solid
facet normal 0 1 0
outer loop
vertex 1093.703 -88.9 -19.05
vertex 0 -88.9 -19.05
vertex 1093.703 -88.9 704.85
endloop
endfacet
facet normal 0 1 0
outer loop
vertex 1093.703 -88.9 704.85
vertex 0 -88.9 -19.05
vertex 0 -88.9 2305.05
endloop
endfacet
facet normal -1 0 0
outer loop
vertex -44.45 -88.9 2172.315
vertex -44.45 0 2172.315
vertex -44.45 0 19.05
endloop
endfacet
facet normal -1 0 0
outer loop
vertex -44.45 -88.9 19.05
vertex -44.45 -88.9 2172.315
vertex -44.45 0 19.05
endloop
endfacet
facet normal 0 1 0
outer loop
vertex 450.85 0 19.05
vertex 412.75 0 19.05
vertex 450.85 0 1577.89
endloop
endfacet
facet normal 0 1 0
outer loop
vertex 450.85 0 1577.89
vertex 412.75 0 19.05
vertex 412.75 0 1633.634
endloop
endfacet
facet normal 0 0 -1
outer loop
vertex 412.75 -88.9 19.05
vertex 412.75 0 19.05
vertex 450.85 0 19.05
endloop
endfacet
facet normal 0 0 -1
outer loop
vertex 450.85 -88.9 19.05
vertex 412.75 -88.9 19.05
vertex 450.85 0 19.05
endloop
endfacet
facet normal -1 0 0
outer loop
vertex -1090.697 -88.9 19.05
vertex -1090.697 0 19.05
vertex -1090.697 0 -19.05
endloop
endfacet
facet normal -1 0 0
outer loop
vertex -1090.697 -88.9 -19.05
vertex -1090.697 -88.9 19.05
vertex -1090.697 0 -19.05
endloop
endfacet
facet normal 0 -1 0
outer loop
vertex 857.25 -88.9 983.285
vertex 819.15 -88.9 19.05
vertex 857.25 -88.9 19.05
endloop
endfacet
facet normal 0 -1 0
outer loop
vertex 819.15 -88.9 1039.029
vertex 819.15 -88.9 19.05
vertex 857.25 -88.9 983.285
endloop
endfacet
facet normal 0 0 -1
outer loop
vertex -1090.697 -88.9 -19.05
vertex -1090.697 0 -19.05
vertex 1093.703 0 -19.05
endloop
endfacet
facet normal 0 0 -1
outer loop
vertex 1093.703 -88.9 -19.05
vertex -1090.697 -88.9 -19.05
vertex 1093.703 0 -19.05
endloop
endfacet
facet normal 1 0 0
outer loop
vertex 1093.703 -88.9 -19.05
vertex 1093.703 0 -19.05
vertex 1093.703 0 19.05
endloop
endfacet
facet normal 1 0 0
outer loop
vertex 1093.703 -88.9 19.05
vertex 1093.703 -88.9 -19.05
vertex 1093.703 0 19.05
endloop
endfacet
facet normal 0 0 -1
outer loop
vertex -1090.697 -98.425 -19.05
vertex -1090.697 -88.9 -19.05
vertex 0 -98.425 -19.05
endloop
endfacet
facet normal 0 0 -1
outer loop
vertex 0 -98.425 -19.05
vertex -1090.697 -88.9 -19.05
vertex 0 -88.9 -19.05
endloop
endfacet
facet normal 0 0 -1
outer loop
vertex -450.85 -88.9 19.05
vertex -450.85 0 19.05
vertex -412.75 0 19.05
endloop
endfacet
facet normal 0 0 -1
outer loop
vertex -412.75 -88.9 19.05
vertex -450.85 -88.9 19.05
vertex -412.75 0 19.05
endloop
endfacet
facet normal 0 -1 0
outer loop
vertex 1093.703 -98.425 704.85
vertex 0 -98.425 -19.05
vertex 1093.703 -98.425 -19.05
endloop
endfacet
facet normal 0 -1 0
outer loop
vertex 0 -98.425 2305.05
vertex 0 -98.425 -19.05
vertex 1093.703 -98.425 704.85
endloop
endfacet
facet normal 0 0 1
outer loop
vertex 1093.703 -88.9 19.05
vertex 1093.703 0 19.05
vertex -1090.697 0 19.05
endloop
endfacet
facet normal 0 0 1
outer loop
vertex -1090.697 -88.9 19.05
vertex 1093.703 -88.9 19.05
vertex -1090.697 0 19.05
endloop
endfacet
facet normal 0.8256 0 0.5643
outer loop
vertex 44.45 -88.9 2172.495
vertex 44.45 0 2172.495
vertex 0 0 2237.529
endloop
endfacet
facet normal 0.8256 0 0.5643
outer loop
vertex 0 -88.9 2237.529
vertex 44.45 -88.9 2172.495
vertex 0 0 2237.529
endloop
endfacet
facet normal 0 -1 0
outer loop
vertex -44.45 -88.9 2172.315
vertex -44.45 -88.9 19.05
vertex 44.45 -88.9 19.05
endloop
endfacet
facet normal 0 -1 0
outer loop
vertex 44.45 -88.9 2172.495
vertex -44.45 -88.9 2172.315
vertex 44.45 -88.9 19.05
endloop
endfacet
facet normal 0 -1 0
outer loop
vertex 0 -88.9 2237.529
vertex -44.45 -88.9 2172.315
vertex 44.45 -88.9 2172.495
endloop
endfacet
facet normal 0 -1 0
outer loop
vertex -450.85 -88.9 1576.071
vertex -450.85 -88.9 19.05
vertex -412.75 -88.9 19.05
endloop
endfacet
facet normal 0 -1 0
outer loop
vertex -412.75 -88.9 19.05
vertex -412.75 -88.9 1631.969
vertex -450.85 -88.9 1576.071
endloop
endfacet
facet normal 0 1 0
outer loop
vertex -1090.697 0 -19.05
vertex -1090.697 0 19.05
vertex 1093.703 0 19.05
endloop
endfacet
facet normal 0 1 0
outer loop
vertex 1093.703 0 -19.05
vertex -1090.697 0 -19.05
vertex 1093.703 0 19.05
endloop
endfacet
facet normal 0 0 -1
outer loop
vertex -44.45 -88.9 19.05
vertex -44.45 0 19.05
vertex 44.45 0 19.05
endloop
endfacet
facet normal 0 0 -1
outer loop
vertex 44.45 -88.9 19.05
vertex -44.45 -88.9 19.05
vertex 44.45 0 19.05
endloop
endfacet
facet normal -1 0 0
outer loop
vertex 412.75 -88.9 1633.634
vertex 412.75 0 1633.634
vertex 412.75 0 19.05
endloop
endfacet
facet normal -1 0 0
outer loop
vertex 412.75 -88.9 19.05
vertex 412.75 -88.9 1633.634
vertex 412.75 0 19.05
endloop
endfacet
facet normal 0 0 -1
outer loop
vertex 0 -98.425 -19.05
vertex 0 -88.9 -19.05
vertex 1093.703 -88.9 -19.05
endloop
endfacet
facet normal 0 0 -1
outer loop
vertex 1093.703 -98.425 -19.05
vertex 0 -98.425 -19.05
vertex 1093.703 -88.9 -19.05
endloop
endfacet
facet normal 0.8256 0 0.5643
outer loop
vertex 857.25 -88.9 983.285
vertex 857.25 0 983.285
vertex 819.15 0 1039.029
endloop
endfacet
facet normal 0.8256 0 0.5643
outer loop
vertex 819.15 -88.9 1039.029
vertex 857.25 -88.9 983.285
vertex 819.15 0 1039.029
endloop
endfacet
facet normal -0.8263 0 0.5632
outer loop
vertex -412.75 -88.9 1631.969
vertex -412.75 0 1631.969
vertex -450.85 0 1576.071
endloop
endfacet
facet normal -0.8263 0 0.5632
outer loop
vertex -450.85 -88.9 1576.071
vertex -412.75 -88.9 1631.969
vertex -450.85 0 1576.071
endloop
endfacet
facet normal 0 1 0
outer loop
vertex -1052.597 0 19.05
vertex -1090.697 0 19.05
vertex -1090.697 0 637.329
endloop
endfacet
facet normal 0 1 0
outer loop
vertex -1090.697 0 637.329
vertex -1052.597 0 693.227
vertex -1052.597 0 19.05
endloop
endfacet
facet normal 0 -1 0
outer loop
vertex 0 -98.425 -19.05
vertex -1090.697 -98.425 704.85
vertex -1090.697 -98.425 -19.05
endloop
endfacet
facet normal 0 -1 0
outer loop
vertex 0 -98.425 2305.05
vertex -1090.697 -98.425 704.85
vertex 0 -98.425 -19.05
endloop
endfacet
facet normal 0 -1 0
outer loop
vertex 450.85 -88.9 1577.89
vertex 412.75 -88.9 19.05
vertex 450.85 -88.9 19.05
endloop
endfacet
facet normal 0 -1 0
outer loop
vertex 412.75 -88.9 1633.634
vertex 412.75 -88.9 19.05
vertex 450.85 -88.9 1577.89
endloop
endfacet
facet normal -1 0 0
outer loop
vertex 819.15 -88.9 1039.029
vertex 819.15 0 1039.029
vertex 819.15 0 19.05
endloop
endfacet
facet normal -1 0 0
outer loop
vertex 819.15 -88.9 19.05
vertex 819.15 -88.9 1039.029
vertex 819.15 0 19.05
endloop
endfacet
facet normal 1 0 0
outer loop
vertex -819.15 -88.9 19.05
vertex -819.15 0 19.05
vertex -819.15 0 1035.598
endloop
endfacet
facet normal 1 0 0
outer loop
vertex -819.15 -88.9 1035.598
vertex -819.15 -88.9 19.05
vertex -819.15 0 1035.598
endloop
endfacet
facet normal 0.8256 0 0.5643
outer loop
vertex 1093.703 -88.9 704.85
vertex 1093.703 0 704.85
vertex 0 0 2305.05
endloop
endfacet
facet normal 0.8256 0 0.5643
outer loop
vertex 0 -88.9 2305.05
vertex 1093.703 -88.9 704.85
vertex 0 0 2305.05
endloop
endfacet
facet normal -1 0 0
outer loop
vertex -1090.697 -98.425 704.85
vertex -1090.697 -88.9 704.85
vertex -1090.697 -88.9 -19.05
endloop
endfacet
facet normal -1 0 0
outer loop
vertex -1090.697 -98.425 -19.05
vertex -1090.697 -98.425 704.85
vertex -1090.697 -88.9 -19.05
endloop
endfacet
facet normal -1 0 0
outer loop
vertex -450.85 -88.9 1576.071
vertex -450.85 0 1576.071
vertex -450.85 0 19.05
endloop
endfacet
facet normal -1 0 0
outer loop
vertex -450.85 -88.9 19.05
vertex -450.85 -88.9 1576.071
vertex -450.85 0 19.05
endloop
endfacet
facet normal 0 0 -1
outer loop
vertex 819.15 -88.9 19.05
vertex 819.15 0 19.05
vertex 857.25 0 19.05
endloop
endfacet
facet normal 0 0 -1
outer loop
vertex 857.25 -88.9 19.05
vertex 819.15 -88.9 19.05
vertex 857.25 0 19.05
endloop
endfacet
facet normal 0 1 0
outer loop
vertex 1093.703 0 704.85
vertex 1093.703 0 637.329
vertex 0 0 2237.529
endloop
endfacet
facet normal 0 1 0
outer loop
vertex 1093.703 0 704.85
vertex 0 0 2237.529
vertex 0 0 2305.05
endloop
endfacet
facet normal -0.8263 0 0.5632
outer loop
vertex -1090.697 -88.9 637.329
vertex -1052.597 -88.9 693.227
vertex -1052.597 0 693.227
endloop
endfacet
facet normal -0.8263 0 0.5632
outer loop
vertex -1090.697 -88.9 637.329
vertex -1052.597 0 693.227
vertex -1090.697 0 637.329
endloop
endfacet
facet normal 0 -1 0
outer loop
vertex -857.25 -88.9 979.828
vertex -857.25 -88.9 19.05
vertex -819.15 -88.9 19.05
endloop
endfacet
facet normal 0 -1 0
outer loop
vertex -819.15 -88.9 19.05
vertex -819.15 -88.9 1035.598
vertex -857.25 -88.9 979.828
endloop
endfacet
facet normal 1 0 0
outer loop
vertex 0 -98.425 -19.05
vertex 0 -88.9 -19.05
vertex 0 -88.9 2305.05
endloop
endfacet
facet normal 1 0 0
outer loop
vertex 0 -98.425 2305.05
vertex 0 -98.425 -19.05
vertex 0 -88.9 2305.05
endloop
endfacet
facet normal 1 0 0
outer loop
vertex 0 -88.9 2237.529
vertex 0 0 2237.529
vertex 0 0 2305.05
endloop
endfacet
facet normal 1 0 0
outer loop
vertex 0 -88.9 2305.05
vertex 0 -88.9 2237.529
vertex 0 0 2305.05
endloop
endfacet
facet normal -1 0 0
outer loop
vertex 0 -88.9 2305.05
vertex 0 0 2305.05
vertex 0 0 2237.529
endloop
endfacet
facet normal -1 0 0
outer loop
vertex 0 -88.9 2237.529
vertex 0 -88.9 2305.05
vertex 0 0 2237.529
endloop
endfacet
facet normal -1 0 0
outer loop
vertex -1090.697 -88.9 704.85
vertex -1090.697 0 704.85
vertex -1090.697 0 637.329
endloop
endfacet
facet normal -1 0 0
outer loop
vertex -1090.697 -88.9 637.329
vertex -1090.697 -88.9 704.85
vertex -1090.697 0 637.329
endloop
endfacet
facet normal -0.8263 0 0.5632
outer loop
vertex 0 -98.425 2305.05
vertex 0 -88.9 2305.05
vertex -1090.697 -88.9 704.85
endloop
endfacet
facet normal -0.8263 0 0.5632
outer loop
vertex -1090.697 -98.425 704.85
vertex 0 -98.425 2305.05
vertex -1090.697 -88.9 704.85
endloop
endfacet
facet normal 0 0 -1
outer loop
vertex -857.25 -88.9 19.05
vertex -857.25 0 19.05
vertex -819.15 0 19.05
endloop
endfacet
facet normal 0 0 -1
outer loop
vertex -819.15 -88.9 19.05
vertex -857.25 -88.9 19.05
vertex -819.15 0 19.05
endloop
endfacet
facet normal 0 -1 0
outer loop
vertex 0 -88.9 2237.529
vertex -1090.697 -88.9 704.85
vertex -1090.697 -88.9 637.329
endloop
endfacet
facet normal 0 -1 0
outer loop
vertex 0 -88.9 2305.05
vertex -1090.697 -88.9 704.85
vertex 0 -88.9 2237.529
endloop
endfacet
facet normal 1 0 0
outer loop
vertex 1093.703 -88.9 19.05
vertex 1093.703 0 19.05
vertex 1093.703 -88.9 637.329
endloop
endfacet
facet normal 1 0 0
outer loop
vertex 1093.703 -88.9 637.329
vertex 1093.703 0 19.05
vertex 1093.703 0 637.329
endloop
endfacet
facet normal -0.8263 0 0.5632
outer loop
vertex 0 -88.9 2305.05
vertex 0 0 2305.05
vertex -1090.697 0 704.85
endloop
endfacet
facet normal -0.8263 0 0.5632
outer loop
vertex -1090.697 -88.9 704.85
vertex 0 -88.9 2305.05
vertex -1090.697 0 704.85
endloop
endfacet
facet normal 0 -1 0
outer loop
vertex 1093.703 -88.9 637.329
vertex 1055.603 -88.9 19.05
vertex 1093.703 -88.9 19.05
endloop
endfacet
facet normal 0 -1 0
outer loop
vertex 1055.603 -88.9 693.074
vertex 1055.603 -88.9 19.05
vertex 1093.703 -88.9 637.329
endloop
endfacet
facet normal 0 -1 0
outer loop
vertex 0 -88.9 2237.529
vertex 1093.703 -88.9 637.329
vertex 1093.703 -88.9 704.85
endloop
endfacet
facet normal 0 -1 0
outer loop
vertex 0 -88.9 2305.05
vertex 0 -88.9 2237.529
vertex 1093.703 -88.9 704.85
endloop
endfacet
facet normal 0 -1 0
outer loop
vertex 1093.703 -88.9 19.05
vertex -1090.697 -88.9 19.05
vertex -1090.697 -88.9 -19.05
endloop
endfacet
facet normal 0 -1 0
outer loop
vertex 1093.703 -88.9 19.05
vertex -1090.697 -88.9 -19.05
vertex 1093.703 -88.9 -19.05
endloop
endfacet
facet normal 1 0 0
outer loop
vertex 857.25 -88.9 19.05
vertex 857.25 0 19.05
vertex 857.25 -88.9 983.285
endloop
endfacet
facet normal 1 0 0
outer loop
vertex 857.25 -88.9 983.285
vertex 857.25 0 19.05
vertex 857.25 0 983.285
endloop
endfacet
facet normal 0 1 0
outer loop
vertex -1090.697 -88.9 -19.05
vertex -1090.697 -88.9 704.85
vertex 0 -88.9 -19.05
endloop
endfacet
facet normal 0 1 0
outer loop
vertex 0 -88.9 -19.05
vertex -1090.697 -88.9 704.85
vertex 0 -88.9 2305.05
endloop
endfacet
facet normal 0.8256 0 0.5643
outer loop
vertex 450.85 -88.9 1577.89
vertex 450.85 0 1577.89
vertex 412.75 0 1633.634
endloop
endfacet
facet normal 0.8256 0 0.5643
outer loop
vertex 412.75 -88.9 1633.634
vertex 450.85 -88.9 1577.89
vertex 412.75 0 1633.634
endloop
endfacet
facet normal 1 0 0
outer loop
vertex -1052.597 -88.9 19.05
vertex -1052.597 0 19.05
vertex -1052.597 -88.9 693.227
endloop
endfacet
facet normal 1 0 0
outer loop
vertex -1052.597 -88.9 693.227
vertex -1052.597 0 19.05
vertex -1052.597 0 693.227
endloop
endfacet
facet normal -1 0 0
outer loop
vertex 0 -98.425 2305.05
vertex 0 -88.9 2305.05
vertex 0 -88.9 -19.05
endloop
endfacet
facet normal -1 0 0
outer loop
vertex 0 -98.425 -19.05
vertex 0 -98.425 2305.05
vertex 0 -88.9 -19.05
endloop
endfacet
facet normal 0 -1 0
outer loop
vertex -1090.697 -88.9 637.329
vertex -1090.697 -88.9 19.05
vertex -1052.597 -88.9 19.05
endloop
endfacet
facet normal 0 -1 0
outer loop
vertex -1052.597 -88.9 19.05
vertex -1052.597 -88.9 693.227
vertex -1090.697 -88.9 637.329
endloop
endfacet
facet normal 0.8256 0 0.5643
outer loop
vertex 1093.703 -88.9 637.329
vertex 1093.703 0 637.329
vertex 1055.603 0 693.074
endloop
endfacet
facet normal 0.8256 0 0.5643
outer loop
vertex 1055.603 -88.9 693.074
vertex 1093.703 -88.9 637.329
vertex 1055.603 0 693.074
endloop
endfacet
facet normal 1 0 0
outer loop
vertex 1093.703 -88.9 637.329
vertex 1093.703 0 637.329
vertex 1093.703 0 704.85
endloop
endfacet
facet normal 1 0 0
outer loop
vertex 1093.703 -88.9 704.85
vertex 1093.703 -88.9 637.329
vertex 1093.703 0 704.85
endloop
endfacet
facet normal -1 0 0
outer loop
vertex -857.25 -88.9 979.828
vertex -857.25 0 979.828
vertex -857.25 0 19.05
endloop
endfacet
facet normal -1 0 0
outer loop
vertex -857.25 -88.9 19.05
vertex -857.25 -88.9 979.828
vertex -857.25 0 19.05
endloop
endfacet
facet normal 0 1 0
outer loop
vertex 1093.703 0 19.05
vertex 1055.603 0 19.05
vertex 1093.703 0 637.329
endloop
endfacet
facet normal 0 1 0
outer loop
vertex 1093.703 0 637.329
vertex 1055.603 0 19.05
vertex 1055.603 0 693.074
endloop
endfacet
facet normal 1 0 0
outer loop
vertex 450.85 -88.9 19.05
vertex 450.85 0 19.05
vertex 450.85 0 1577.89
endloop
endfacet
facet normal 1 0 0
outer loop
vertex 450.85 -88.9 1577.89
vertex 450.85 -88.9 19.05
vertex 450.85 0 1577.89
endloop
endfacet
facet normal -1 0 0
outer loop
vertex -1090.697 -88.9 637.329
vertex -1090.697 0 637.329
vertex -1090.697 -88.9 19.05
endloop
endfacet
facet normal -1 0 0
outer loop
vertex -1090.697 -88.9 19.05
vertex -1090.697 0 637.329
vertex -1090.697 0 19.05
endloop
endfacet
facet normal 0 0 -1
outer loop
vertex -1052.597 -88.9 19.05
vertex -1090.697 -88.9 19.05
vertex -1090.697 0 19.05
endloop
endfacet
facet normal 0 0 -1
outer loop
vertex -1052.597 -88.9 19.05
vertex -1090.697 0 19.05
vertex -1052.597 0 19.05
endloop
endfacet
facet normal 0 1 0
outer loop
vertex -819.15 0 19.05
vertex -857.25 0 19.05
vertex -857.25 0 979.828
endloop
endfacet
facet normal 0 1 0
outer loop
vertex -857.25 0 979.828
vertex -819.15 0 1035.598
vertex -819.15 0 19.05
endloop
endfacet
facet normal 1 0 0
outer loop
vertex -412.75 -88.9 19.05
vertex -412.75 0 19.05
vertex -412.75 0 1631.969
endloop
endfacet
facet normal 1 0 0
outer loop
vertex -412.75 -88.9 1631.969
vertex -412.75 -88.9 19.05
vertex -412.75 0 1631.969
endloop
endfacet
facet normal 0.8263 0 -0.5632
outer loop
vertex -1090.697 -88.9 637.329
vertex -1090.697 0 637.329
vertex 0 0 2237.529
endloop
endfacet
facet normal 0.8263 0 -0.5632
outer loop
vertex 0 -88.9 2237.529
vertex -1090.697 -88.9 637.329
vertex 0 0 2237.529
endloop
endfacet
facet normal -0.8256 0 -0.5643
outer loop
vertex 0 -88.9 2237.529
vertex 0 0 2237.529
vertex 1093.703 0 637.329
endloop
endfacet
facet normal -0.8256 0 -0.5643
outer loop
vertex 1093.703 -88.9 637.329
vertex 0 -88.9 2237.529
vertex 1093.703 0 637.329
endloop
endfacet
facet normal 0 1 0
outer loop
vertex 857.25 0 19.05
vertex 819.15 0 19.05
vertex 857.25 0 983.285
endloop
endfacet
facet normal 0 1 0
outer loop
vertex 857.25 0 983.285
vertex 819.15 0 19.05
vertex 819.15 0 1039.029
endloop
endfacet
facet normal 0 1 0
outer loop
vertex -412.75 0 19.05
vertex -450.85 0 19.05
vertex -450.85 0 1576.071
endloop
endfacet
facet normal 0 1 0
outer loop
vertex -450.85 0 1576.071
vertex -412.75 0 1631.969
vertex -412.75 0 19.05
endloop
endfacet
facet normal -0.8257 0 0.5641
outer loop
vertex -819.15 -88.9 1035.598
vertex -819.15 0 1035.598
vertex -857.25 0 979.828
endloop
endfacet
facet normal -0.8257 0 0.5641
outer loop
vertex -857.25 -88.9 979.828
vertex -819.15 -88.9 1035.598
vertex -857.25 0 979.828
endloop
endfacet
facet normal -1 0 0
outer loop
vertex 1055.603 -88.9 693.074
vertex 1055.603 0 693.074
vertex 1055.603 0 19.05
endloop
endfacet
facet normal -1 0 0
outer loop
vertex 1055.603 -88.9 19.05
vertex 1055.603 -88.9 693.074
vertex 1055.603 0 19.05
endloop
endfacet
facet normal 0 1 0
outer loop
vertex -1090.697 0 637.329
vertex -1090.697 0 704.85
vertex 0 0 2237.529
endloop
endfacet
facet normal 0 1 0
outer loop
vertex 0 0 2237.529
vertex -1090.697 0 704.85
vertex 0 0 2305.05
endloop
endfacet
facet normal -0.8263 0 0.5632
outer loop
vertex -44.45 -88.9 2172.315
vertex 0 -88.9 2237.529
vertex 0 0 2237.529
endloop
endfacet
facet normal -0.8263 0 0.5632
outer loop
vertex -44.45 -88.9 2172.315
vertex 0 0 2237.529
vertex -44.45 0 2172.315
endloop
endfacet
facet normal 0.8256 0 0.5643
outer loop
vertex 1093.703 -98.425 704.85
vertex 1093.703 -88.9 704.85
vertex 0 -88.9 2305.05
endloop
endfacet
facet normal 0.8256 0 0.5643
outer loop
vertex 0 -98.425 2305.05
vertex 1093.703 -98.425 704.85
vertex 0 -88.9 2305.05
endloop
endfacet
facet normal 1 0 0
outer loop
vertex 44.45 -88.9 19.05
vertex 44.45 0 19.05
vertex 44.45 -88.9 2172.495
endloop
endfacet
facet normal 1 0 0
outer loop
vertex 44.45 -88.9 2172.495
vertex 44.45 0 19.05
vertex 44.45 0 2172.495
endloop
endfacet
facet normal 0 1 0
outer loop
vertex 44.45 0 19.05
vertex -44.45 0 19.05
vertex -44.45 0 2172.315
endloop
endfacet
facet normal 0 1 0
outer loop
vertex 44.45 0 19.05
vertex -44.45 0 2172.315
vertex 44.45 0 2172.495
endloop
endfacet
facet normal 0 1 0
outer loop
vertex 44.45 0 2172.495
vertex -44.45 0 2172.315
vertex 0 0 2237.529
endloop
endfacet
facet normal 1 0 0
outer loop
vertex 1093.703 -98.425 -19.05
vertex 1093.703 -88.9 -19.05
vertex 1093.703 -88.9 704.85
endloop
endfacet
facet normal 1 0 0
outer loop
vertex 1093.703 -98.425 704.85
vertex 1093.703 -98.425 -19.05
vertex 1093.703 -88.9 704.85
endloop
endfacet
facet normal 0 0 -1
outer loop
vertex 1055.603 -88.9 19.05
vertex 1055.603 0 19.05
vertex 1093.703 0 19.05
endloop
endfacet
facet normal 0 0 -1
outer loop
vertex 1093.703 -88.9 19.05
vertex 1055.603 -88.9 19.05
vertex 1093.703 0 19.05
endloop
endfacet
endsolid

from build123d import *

# Parameters (mm, degrees)
F1_DEPTH = 88.9
F2_DEPTH = 88.9
F3_DEPTH = 88.9
F5_DEPTH = 9.525
F6_DEPTH = 9.525


with BuildPart() as f1:
    # F0 (on Front) → F1 (new body)
    with BuildSketch(Plane.XZ):
        Polygon((-1090.6967822675, 637.3294345384), (-1090.6967822675, 19.05), (-1052.5967822675, 19.05), (-1052.5967822675, 693.2272981713), align=None)
    extrude(amount=F1_DEPTH)


with BuildPart() as f1b:
    # F0 (on Front) → F1, piece 2 (new body)
    with BuildSketch(Plane.XZ):
        Polygon((-857.25, 979.8275027988), (-857.25, 19.05), (-819.15, 19.05), (-819.15, 1035.5984547879), align=None)
    extrude(amount=F1_DEPTH)


with BuildPart() as f1c:
    # F0 (on Front) → F1, piece 3 (new body)
    with BuildSketch(Plane.XZ):
        Polygon((-412.75, 19.05), (-412.75, 1631.9692451823), (-450.85, 1576.0713815494), (-450.85, 19.05), align=None)
    extrude(amount=F1_DEPTH)


with BuildPart() as f1d:
    # F0 (on Front) → F1, piece 4 (new body)
    with BuildSketch(Plane.XZ):
        Polygon((44.45, 2172.4945248419), (0, 2237.5294345384), (-44.45, 2172.3152603001), (-44.45, 19.05), (44.45, 19.05), align=None)
    extrude(amount=F1_DEPTH)


with BuildPart() as f1e:
    # F0 (on Front) → F1, piece 5 (new body)
    with BuildSketch(Plane.XZ):
        Polygon((412.75, 19.05), (450.85, 19.05), (450.85, 1577.8896361883), (412.75, 1633.6338444996), align=None)
    extrude(amount=F1_DEPTH)


with BuildPart() as f1f:
    # F0 (on Front) → F1, piece 6 (new body)
    with BuildSketch(Plane.XZ):
        Polygon((819.15, 19.05), (857.25, 19.05), (857.25, 983.2847475346), (819.15, 1039.0289558459), align=None)
    extrude(amount=F1_DEPTH)


with BuildPart() as f1g:
    # F0 (on Front) → F1, piece 7 (new body)
    with BuildSketch(Plane.XZ):
        Polygon((1055.6032177325, 19.05), (1093.7032177325, 19.05), (1093.7032177325, 637.3294345384), (1055.6032177325, 693.0736428497), align=None)
    extrude(amount=F1_DEPTH)


with BuildPart() as f2:
    # F0 (on Front) → F2 (new body)
    with BuildSketch(Plane.XZ):
        Polygon((0, 2237.5294345384), (0, 2305.05), (-1090.6967822675, 704.85), (-1052.5967822675, 704.85), (-1052.5967822675, 693.2272981713), (-857.25, 979.8275027988), (-450.85, 1576.0713815494), (-412.75, 1631.9692451823), (-44.45, 2172.3152603001), align=None)
        Polygon((-1090.6967822675, 704.85), (-1090.6967822675, 637.3294345384), (-1052.5967822675, 693.2272981713), (-1052.5967822675, 704.85), align=None)
    extrude(amount=F2_DEPTH)


with BuildPart() as f2b:
    # F0 (on Front) → F2, piece 2 (new body)
    with BuildSketch(Plane.XZ):
        Polygon((1093.7032177325, -19.05), (1093.7032177325, 19.05), (1055.6032177325, 19.05), (857.25, 19.05), (819.15, 19.05), (450.85, 19.05), (412.75, 19.05), (44.45, 19.05), (-44.45, 19.05), (-412.75, 19.05), (-450.85, 19.05), (-819.15, 19.05), (-857.25, 19.05), (-1052.5967822675, 19.05), (-1090.6967822675, 19.05), (-1090.6967822675, -19.05), align=None)
    extrude(amount=F2_DEPTH)


with BuildPart() as f3:
    # F0 (on Front) → F3 (new body)
    with BuildSketch(Plane.XZ):
        Polygon((857.25, 983.2847475346), (1055.6032177325, 693.0736428497), (1055.6032177325, 704.85), (1093.7032177325, 704.85), (0, 2305.05), (0, 2237.5294345384), (44.45, 2172.4945248419), (412.75, 1633.6338444996), (450.85, 1577.8896361883), (819.15, 1039.0289558459), align=None)
        Polygon((1055.6032177325, 693.0736428497), (1093.7032177325, 637.3294345384), (1093.7032177325, 704.85), (1055.6032177325, 704.85), align=None)
    extrude(amount=F3_DEPTH)


with BuildPart() as f5:
    # F4 (on face) → F5 (new body)
    with BuildSketch(Plane.XZ.offset(88.9)):
        Polygon((0, 2237.5294345384), (0, 2305.05), (-1090.6967822675, 704.85), (-1090.6967822675, 637.3294345384), (-1090.6967822675, 19.05), (-1090.6967822675, -19.05), (0, -19.05), (0, 19.05), (-44.45, 19.05), (-44.45, 2172.3152603001), align=None)
        Polygon((0, 19.05), (0, 2237.5294345384), (-44.45, 2172.3152603001), (-44.45, 19.05), align=None)
    extrude(amount=F5_DEPTH)


with BuildPart() as f6:
    # F4 (on face) → F6 (new body)
    with BuildSketch(Plane.XZ.offset(88.9)):
        Polygon((1093.7032177325, 704.85), (0, 2305.05), (0, 2237.5294345384), (44.45, 2172.4945248419), (44.45, 19.05), (0, 19.05), (0, -19.05), (1093.7032177325, -19.05), (1093.7032177325, 19.05), (1093.7032177325, 637.3294345384), align=None)
        Polygon((44.45, 2172.4945248419), (0, 2237.5294345384), (0, 19.05), (44.45, 19.05), align=None)
    extrude(amount=F6_DEPTH)


solid = Compound([f1.part, f1b.part, f1c.part, f1d.part, f1e.part, f1f.part, f1g.part, f2.part, f2b.part, f3.part, f5.part, f6.part])
